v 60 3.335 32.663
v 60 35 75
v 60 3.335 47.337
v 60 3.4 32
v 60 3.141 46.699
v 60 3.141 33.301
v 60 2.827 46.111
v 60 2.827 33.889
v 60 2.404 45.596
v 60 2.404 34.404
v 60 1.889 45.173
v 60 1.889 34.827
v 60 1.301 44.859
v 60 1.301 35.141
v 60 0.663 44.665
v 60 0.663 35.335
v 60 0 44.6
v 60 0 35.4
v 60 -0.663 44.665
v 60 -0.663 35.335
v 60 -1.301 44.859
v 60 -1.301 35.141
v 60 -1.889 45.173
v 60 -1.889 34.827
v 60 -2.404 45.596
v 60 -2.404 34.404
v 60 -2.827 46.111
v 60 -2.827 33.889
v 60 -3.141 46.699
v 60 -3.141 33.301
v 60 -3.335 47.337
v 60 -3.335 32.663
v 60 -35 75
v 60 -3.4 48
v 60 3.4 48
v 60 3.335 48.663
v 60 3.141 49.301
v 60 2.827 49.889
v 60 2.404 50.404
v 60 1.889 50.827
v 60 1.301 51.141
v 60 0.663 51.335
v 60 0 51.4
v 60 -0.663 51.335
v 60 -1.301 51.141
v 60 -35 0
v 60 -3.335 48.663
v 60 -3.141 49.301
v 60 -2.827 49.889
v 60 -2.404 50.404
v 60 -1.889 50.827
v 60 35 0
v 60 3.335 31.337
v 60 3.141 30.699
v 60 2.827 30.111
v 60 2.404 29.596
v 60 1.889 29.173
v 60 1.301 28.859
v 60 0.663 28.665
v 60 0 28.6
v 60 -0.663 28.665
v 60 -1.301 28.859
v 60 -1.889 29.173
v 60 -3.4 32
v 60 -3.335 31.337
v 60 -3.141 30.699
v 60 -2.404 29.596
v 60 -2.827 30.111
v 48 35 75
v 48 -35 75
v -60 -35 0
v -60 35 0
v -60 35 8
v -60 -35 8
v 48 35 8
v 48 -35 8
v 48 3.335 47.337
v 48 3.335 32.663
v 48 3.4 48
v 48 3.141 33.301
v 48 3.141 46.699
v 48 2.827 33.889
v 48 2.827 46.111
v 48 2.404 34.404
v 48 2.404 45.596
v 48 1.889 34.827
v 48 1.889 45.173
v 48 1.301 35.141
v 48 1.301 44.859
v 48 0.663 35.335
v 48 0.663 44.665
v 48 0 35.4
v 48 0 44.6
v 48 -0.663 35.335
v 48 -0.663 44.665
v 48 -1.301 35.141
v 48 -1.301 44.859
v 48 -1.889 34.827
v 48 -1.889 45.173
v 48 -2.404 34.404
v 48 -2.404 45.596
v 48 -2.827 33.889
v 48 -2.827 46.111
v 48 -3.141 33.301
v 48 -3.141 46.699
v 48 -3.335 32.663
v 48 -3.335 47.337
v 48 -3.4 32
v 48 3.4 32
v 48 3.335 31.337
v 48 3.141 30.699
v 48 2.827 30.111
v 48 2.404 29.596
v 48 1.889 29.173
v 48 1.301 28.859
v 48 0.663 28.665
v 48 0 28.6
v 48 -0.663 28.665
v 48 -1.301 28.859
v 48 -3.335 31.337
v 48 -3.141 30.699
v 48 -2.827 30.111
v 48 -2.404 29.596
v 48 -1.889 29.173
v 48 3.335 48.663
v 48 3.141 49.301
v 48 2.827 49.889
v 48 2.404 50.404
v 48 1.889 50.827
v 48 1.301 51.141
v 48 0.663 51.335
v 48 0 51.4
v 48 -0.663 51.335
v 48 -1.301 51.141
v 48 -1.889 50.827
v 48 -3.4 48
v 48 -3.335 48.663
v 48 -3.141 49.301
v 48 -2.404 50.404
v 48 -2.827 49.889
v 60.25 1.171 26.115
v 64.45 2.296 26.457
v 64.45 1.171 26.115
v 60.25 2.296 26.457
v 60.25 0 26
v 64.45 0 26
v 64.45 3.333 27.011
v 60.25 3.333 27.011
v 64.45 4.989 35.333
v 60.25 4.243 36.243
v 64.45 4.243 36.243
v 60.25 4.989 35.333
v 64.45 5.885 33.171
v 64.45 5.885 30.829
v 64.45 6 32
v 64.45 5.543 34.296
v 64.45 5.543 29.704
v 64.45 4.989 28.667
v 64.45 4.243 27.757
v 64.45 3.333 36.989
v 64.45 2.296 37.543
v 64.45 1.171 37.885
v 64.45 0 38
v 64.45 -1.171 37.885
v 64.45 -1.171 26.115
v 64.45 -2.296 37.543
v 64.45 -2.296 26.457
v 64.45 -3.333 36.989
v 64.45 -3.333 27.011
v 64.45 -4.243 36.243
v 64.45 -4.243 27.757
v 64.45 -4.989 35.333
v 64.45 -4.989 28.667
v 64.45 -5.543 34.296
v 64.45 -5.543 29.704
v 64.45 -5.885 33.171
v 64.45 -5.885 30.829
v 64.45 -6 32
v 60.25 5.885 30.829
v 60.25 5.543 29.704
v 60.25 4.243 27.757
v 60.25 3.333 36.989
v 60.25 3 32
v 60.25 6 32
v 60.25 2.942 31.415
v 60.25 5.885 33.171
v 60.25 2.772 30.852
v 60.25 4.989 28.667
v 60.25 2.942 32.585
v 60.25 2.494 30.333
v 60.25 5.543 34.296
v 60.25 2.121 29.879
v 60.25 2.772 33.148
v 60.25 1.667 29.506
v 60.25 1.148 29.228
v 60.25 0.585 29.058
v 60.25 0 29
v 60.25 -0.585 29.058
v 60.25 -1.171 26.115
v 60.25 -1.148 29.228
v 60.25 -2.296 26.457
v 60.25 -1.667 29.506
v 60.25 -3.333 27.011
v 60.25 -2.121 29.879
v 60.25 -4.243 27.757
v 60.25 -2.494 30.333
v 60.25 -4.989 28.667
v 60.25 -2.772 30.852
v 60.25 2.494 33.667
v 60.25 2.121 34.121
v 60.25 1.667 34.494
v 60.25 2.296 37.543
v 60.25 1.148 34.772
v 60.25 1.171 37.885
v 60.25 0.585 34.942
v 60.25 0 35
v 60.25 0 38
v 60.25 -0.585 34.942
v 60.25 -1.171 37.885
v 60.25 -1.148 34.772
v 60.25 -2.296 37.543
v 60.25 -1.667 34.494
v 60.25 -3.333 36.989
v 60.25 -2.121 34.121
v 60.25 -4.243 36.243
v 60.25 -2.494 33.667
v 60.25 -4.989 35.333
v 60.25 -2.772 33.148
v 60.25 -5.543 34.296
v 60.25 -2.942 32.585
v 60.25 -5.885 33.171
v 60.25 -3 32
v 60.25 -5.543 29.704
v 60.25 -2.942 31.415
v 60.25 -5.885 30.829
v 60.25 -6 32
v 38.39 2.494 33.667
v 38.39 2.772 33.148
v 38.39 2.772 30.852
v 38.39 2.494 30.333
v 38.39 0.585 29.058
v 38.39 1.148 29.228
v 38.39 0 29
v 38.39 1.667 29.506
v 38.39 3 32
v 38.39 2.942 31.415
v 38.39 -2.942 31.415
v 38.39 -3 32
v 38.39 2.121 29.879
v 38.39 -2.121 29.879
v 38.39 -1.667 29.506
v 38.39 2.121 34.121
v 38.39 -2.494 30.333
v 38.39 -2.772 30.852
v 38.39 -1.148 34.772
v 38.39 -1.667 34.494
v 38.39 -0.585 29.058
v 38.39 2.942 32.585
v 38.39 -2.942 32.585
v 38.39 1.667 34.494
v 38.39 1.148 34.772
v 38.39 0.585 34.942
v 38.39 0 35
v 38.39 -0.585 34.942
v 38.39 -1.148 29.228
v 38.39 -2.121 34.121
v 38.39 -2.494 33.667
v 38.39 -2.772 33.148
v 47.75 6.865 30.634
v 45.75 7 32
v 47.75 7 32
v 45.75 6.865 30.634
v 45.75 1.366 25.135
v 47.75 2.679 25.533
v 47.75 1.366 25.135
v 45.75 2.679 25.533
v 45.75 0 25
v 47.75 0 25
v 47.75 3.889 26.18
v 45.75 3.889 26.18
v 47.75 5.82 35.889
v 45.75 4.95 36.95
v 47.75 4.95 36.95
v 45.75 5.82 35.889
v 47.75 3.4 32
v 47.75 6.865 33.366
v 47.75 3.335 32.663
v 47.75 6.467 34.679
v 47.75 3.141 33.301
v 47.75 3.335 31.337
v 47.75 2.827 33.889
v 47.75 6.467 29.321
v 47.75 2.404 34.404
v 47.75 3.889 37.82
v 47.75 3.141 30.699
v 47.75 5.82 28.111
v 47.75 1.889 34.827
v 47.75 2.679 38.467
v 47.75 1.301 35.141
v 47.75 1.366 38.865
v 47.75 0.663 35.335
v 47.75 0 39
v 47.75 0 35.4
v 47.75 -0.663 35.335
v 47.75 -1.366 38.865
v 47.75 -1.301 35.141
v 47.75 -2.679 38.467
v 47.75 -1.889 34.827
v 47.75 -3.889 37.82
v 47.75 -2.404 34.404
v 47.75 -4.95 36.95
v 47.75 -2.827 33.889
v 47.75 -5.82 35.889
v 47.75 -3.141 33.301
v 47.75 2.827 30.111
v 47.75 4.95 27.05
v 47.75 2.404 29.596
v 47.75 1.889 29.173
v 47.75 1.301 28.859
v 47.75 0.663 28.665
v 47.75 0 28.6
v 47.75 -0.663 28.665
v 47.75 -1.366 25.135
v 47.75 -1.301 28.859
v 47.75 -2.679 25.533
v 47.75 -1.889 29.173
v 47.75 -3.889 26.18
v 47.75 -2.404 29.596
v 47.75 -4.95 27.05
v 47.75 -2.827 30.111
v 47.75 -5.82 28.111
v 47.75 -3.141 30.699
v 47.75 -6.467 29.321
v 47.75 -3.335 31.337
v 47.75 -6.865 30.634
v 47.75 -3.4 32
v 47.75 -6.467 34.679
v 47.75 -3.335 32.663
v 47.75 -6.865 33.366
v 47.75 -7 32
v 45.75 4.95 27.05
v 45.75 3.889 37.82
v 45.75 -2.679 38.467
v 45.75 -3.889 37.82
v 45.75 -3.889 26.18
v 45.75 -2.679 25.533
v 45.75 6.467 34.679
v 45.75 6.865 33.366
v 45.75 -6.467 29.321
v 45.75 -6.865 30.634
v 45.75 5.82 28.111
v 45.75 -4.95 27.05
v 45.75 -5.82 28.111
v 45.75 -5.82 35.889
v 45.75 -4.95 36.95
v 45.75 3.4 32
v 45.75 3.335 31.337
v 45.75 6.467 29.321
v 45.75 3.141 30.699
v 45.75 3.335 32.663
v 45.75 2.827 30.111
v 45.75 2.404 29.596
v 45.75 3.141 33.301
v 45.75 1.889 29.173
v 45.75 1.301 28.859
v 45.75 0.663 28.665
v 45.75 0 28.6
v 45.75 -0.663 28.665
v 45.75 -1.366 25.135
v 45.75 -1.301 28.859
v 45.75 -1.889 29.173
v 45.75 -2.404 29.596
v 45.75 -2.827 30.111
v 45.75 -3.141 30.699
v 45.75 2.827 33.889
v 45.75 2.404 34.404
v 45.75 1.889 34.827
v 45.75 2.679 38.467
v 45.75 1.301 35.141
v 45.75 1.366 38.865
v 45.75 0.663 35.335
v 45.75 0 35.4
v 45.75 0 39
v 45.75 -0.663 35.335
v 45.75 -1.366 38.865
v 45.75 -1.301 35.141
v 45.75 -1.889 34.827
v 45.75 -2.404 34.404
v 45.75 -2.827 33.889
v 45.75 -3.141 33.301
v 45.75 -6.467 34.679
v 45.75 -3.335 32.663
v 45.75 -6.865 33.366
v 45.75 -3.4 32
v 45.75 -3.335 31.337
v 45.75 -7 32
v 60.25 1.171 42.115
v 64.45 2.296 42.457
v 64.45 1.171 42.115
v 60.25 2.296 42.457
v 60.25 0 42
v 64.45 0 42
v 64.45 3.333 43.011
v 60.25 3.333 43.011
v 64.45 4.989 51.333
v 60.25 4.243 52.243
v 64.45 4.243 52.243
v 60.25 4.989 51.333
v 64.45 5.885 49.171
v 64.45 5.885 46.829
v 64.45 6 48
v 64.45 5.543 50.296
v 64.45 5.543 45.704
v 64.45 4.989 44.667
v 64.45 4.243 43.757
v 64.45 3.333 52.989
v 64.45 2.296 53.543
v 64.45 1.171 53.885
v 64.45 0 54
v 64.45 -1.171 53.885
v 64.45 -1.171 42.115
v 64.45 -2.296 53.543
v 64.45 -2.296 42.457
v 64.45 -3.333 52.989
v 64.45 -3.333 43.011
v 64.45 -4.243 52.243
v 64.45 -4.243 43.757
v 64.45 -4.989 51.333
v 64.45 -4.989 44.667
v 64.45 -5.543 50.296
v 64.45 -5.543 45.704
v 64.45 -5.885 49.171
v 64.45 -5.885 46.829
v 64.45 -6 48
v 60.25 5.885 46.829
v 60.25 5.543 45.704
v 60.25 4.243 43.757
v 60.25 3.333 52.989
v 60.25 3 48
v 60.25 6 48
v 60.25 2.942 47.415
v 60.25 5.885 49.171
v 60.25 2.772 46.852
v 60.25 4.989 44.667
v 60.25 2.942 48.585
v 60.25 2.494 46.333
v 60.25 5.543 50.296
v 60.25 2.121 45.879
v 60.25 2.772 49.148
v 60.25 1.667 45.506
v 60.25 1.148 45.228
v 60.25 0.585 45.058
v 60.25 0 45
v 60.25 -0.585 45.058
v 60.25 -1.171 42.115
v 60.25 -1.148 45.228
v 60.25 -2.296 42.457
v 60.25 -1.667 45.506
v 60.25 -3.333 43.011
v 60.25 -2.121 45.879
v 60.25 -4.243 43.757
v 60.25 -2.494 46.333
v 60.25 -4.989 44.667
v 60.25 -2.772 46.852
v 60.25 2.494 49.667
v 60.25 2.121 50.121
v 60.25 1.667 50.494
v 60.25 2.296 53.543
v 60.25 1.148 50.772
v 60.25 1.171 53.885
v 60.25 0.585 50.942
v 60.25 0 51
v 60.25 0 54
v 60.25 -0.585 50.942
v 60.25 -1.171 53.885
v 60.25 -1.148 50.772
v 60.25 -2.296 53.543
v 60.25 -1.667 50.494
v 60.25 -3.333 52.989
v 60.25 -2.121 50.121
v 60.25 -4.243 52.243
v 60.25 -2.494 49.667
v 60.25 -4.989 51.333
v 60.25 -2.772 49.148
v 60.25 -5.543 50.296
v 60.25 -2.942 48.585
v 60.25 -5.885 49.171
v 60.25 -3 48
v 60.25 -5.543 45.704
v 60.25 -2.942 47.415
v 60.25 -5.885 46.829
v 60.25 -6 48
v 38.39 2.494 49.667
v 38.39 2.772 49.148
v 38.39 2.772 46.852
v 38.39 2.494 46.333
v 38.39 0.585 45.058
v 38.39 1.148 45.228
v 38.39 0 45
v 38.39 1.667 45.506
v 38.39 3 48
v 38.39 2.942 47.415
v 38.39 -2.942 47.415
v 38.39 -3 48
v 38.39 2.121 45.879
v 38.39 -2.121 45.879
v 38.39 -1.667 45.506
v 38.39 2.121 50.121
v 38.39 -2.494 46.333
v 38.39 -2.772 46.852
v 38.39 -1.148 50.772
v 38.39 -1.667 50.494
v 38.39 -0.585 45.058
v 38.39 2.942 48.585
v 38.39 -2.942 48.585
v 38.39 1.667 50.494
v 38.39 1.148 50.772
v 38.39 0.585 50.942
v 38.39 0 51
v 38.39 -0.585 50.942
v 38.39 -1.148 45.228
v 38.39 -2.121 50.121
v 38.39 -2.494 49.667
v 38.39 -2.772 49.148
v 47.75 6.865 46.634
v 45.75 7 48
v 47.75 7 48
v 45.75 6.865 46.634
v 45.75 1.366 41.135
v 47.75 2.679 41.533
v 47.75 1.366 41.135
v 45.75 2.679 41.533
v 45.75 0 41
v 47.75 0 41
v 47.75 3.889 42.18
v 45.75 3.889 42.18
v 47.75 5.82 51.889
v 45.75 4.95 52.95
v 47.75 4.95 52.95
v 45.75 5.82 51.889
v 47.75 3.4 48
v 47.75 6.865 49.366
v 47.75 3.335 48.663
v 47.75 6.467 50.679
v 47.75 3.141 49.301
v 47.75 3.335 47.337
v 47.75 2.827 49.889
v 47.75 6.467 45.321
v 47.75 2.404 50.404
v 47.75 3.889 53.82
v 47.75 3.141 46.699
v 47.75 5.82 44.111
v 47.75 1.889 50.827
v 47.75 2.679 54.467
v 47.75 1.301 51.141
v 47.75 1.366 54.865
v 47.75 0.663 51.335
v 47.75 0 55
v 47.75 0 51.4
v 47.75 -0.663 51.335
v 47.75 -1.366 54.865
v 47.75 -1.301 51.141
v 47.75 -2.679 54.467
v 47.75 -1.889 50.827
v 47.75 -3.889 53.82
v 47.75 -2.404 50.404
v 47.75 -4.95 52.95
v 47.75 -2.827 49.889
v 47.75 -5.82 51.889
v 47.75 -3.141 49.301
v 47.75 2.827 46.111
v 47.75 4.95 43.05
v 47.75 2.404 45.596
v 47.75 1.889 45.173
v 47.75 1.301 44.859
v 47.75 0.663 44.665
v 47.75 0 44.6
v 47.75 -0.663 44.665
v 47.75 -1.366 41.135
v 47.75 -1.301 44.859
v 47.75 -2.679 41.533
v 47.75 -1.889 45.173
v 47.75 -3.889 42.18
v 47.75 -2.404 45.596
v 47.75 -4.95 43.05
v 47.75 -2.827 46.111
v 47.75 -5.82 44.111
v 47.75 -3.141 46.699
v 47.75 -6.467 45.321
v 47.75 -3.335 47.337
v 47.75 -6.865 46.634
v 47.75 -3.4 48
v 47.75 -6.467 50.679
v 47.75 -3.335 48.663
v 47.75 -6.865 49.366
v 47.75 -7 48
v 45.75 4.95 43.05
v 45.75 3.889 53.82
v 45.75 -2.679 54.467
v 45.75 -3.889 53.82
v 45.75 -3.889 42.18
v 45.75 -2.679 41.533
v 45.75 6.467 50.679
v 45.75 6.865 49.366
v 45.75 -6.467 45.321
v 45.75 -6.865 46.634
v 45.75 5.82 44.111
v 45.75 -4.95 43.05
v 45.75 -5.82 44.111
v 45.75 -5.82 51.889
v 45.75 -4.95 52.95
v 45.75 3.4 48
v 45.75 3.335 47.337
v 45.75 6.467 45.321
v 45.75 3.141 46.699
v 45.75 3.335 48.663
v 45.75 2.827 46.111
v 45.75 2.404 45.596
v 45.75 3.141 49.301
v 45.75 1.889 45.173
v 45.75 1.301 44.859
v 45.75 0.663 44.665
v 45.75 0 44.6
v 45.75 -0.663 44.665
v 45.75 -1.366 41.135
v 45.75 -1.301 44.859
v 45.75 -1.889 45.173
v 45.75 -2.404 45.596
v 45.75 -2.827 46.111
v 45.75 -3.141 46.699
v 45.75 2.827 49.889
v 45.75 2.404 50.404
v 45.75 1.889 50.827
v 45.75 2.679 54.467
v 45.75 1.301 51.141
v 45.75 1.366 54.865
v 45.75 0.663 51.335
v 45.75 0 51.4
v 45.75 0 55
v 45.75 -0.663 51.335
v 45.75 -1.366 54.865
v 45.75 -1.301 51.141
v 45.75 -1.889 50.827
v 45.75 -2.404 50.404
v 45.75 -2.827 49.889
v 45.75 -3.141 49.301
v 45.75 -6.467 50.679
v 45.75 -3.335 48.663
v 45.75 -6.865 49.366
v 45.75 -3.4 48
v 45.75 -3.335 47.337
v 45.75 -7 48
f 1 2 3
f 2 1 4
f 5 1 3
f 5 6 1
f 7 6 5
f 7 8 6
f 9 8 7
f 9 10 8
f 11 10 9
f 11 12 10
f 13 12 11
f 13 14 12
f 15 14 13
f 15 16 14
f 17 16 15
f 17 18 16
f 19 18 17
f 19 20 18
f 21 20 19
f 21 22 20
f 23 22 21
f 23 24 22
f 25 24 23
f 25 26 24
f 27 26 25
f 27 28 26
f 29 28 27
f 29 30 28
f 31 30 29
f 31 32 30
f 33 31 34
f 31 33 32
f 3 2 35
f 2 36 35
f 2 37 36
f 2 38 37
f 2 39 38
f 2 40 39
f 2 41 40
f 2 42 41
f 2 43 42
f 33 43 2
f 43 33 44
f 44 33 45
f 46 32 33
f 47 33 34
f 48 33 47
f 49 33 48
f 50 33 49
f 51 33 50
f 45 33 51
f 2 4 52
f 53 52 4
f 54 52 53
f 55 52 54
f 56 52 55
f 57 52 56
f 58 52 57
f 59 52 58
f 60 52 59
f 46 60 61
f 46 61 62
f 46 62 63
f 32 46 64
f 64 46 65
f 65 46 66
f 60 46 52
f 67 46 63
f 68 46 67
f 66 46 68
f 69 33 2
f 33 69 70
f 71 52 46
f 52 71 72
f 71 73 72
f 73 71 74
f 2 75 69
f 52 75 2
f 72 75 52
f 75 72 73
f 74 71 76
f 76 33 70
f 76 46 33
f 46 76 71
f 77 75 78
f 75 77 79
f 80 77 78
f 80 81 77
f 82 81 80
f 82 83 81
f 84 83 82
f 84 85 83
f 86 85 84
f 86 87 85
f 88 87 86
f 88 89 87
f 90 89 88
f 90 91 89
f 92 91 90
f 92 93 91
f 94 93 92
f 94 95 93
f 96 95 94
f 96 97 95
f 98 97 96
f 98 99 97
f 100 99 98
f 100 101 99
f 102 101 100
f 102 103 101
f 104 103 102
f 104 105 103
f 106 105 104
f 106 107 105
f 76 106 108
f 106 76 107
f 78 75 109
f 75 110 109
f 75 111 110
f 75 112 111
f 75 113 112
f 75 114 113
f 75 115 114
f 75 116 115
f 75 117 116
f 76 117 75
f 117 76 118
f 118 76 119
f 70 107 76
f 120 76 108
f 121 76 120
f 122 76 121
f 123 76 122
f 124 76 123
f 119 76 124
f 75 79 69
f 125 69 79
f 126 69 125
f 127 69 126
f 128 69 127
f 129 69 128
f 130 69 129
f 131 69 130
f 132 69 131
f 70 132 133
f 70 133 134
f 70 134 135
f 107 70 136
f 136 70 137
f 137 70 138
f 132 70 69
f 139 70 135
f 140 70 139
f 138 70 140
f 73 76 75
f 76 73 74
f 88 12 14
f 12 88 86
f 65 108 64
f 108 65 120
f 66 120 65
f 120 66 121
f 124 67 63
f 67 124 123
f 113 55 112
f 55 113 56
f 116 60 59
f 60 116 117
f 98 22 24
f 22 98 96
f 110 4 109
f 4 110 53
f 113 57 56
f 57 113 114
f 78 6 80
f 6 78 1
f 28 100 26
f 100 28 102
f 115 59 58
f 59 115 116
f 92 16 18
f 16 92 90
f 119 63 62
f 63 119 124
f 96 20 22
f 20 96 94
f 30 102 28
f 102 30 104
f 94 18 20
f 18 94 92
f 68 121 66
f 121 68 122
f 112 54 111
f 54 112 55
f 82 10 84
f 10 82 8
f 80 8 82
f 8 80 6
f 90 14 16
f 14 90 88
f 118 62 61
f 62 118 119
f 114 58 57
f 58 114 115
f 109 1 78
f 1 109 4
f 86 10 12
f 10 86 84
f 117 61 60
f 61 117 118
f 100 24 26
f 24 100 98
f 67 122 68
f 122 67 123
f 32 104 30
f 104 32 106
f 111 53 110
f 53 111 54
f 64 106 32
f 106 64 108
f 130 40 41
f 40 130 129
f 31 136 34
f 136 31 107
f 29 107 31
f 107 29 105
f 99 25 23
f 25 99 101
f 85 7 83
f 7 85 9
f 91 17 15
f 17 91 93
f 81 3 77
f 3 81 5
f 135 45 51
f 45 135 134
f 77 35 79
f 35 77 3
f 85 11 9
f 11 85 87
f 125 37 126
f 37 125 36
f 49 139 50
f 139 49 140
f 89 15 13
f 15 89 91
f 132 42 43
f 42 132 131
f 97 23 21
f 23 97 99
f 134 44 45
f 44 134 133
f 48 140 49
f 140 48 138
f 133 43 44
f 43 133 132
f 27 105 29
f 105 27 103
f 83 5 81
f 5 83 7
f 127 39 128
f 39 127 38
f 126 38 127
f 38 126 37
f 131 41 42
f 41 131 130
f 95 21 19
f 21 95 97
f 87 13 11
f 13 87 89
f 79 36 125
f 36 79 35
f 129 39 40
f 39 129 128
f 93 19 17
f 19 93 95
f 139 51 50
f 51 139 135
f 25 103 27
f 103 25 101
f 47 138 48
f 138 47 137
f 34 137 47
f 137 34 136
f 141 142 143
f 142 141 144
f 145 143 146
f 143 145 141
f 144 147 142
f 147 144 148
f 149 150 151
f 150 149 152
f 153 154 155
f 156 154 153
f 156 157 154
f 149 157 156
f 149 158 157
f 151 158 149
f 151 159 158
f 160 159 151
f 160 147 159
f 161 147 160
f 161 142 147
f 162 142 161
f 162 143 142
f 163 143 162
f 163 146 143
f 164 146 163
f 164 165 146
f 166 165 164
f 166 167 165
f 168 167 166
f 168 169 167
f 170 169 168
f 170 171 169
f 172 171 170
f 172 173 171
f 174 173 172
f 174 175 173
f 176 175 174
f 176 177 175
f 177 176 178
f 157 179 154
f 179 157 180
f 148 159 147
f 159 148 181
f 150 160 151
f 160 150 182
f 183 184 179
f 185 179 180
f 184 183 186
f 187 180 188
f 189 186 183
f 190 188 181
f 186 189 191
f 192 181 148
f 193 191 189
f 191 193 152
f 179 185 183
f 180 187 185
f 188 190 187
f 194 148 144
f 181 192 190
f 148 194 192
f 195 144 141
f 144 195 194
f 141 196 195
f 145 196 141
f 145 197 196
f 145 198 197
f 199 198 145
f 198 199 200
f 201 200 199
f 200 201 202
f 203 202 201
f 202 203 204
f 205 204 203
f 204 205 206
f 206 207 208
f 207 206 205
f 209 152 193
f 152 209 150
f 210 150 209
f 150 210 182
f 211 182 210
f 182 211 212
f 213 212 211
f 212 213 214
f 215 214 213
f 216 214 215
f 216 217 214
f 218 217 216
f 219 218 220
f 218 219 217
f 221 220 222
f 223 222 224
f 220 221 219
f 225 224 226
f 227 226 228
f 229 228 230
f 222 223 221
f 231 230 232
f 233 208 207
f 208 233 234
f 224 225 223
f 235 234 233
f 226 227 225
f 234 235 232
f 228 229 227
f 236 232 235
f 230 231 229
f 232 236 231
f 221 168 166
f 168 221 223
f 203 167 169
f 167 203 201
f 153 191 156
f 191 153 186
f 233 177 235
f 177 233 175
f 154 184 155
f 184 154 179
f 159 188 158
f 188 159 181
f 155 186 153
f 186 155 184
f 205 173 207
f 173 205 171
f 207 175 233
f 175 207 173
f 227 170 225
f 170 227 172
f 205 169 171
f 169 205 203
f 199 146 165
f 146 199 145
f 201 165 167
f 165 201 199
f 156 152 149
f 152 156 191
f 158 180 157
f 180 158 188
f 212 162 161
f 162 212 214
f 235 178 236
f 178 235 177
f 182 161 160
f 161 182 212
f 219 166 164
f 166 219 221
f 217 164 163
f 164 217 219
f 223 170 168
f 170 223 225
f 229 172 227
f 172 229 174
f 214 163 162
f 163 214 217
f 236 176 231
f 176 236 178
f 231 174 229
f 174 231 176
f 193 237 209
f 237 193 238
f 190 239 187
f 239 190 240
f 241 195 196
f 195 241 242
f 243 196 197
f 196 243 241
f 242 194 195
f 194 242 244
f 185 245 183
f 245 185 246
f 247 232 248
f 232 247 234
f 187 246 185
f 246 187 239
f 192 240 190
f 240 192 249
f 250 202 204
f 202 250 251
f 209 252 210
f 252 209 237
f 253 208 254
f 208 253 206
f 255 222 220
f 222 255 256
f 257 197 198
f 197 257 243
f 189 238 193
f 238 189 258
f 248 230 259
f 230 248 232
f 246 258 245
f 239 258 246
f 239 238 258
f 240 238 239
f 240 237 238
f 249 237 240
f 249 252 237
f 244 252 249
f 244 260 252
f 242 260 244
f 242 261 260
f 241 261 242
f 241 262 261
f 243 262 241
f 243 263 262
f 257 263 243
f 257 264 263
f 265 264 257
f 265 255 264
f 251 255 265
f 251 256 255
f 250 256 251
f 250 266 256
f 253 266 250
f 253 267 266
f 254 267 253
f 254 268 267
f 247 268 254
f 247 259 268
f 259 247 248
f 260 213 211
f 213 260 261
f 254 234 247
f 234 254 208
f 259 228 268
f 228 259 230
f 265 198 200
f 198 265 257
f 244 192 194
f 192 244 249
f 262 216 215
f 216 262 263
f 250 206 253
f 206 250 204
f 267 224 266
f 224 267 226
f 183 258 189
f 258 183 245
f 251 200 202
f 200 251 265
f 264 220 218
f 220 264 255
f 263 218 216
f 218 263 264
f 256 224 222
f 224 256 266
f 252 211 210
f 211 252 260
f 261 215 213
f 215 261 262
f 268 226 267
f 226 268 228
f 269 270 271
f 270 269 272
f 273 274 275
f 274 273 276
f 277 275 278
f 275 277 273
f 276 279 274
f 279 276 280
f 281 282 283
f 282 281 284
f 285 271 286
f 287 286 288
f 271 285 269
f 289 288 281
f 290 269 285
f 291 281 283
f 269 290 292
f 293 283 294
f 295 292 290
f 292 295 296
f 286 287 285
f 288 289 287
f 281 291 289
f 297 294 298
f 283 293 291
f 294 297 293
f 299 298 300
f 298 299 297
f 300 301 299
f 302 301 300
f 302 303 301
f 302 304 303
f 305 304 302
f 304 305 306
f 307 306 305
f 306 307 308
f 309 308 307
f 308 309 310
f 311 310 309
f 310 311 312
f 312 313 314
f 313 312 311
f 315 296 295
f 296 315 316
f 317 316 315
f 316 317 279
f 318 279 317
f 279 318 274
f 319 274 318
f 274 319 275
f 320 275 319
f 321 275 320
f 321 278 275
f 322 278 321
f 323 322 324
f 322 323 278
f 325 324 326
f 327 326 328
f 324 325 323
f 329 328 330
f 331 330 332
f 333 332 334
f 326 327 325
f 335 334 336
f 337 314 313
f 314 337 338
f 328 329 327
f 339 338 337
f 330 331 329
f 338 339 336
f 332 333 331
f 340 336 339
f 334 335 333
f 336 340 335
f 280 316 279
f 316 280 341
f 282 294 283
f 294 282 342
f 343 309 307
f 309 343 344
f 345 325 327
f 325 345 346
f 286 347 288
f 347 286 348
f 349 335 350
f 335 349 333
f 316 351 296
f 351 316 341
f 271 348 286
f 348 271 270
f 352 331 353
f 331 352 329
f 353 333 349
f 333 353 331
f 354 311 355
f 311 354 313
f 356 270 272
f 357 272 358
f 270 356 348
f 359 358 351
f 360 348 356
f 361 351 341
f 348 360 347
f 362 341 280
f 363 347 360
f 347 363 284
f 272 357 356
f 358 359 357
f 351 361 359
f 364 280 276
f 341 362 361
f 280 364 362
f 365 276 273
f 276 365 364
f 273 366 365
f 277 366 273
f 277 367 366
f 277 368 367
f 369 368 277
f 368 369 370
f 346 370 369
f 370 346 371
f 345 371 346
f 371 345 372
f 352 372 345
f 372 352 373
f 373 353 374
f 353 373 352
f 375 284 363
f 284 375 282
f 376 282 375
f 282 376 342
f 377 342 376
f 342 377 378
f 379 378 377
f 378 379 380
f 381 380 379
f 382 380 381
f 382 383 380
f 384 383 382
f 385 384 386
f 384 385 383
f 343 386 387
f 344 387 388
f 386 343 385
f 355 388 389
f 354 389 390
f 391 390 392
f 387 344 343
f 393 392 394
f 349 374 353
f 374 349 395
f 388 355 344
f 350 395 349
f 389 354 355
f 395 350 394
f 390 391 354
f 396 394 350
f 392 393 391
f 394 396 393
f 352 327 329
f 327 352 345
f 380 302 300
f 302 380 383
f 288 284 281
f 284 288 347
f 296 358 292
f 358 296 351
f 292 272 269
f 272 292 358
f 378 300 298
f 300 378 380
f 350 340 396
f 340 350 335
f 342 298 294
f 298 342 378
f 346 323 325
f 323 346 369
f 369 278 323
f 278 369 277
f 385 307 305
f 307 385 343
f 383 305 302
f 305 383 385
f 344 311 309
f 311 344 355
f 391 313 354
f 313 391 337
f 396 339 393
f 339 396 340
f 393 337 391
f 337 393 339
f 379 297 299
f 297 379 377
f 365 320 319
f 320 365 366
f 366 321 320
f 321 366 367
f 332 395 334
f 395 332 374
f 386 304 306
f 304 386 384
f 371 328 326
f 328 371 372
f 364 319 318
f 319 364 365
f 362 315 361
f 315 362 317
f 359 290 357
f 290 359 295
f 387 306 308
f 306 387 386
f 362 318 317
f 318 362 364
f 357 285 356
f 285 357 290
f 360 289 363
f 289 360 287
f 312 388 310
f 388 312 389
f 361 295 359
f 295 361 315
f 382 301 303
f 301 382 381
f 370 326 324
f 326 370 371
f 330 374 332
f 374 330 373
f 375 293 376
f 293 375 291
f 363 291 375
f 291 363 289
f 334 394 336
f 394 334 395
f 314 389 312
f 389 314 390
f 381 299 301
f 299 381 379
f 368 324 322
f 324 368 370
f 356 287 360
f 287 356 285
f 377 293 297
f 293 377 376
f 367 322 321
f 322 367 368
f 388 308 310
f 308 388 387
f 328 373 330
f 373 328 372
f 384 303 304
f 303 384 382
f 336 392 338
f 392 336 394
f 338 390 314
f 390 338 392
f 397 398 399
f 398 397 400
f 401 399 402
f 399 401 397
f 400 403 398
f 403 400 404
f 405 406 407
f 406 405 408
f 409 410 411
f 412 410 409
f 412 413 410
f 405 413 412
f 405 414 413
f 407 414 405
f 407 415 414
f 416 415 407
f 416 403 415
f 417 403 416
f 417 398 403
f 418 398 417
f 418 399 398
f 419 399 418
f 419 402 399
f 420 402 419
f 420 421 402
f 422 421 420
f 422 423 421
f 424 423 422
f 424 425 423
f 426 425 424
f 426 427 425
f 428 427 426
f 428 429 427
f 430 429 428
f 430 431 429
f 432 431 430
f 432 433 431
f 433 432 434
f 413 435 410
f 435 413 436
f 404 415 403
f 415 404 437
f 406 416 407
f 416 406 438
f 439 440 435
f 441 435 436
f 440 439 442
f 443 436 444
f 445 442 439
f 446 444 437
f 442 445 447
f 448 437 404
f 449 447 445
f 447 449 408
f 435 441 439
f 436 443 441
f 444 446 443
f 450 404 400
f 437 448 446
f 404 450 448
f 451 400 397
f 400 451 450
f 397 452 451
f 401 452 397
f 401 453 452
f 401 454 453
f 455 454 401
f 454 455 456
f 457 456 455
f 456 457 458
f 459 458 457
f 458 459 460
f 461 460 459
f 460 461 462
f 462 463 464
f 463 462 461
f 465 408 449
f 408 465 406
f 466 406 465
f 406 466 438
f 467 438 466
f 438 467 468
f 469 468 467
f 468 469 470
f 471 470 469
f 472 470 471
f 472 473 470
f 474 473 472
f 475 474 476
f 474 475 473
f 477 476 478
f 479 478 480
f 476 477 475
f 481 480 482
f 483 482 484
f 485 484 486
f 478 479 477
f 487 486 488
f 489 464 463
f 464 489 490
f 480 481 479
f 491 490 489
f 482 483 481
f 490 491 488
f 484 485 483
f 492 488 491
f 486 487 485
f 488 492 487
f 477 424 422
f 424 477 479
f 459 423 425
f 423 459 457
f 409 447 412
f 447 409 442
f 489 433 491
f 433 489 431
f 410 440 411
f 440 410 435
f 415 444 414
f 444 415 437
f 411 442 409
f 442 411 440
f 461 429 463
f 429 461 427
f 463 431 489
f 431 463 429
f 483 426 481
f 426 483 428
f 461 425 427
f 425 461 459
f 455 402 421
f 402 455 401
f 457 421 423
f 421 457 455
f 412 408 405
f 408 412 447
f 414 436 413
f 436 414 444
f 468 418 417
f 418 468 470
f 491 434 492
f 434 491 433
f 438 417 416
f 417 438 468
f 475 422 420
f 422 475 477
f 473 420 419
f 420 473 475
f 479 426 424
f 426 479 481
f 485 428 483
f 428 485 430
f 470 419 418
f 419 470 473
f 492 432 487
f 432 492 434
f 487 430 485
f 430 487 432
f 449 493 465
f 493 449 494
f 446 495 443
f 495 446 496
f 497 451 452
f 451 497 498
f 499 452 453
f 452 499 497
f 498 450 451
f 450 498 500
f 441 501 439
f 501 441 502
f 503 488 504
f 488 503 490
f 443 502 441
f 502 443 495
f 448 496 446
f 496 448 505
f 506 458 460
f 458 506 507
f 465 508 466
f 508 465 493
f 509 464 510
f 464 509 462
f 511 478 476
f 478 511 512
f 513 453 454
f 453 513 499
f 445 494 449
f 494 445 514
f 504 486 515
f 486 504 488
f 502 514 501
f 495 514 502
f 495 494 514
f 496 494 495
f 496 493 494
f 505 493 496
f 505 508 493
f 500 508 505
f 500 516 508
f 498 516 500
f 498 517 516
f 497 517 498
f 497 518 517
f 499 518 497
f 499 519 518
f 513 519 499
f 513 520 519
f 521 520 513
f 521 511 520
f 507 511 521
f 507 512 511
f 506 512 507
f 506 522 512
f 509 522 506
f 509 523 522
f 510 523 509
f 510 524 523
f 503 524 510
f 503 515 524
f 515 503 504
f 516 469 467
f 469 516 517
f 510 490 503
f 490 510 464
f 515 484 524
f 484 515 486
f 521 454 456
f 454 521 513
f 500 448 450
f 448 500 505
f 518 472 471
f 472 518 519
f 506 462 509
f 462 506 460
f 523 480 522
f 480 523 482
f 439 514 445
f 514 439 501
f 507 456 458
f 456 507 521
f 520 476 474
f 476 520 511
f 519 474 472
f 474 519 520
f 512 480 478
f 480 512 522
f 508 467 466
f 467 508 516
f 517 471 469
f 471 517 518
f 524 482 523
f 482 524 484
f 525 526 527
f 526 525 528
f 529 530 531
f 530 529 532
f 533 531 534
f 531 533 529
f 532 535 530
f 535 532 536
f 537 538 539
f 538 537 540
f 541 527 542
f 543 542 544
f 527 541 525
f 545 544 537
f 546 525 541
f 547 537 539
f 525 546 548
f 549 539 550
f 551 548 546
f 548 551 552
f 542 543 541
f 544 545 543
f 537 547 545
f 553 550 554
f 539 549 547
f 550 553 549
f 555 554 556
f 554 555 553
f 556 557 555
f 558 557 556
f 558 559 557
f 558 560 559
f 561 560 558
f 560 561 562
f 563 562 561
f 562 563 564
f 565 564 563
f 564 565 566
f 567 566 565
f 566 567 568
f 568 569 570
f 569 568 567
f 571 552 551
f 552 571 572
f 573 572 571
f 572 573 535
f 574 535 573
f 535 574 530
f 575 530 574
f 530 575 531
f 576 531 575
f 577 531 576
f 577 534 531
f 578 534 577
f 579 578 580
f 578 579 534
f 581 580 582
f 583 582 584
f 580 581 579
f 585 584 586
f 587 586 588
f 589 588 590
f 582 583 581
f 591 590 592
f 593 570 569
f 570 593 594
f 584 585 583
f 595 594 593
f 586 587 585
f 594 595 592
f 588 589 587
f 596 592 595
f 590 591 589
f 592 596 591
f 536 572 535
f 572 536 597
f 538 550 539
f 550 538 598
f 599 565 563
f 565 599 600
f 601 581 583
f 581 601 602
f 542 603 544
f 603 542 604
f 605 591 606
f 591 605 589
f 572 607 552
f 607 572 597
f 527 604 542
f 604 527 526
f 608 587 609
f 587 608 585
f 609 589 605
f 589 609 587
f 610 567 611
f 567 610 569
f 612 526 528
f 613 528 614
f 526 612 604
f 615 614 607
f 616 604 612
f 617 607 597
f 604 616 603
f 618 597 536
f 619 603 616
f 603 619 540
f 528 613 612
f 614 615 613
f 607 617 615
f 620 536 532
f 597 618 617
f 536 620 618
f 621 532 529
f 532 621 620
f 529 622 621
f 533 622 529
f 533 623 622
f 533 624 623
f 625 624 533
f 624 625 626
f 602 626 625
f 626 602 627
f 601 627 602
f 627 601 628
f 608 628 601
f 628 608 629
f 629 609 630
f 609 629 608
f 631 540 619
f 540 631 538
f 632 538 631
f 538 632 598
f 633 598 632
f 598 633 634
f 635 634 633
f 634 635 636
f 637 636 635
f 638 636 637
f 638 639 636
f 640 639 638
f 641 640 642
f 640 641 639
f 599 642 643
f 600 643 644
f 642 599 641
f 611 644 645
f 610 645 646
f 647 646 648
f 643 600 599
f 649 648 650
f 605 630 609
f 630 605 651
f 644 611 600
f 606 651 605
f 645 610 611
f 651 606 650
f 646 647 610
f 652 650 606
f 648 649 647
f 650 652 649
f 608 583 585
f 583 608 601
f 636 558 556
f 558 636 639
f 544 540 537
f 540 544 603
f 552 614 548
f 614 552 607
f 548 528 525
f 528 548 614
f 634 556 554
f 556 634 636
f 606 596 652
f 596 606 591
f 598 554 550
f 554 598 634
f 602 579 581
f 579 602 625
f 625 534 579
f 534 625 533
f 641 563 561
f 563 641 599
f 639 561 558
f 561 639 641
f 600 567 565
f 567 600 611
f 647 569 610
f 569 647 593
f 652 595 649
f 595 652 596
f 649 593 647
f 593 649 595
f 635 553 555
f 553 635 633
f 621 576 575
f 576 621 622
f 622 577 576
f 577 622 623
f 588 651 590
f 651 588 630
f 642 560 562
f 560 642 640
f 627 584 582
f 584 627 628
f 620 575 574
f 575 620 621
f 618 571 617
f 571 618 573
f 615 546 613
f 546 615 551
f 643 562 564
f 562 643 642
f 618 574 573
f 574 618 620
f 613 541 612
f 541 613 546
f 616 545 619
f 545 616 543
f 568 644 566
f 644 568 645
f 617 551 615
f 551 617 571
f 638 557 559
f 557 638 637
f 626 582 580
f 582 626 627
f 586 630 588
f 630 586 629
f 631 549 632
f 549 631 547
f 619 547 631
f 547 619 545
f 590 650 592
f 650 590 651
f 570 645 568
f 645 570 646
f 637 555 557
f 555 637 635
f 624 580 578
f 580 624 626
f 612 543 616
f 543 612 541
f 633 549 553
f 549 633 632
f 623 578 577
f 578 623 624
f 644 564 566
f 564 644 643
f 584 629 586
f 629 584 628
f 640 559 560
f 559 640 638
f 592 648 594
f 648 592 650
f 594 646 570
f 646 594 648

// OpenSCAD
$fn = 32;

// ------------------------------------------------------------------------
// Bolted bracket: 120 x 70 mm bracket with 2 bolt joints
// Every part is its own module, assembly() places them once.
// ------------------------------------------------------------------------

// --- part 1 ---
module bracket() {
  difference() {
    translate([-60, -35, 0]) cube([120, 70, 75]);
    translate([-61, -36, 8]) cube([109, 72, 68]);
    translate([54, 0, 32]) rotate([0, 90, 0]) cylinder(h = 14, d = 6.8, center = true);
    translate([54, 0, 48]) rotate([0, 90, 0]) cylinder(h = 14, d = 6.8, center = true);
  }
}

// --- part 2 ---
module bolt1() {
  cylinder(h = 4.2, d = 12);
  translate([0, 0, -21.86]) cylinder(h = 21.86, d = 6);
}

// --- part 3 ---
module washer1() {
  difference() {
      translate([0, 0, 0]) cylinder(h = 2, d = 14);
      translate([0, 0, -1]) cylinder(h = 4, d = 6.8);
    }
}

// --- part 4 ---
module bolt2() {
  cylinder(h = 4.2, d = 12);
  translate([0, 0, -21.86]) cylinder(h = 21.86, d = 6);
}

// --- part 5 ---
module washer2() {
  difference() {
      translate([0, 0, 0]) cylinder(h = 2, d = 14);
      translate([0, 0, -1]) cylinder(h = 4, d = 6.8);
    }
}

// --- assembly ---
module assembly() {
  translate([0, 0, 0]) rotate([0, 0, 0]) bracket();
  translate([60.25, 0, 32]) rotate([0, 90, 0]) bolt1();
  translate([45.75, 0, 32]) rotate([0, 90, 0]) washer1();
  translate([60.25, 0, 48]) rotate([0, 90, 0]) bolt2();
  translate([45.75, 0, 48]) rotate([0, 90, 0]) washer2();
}

assembly();
